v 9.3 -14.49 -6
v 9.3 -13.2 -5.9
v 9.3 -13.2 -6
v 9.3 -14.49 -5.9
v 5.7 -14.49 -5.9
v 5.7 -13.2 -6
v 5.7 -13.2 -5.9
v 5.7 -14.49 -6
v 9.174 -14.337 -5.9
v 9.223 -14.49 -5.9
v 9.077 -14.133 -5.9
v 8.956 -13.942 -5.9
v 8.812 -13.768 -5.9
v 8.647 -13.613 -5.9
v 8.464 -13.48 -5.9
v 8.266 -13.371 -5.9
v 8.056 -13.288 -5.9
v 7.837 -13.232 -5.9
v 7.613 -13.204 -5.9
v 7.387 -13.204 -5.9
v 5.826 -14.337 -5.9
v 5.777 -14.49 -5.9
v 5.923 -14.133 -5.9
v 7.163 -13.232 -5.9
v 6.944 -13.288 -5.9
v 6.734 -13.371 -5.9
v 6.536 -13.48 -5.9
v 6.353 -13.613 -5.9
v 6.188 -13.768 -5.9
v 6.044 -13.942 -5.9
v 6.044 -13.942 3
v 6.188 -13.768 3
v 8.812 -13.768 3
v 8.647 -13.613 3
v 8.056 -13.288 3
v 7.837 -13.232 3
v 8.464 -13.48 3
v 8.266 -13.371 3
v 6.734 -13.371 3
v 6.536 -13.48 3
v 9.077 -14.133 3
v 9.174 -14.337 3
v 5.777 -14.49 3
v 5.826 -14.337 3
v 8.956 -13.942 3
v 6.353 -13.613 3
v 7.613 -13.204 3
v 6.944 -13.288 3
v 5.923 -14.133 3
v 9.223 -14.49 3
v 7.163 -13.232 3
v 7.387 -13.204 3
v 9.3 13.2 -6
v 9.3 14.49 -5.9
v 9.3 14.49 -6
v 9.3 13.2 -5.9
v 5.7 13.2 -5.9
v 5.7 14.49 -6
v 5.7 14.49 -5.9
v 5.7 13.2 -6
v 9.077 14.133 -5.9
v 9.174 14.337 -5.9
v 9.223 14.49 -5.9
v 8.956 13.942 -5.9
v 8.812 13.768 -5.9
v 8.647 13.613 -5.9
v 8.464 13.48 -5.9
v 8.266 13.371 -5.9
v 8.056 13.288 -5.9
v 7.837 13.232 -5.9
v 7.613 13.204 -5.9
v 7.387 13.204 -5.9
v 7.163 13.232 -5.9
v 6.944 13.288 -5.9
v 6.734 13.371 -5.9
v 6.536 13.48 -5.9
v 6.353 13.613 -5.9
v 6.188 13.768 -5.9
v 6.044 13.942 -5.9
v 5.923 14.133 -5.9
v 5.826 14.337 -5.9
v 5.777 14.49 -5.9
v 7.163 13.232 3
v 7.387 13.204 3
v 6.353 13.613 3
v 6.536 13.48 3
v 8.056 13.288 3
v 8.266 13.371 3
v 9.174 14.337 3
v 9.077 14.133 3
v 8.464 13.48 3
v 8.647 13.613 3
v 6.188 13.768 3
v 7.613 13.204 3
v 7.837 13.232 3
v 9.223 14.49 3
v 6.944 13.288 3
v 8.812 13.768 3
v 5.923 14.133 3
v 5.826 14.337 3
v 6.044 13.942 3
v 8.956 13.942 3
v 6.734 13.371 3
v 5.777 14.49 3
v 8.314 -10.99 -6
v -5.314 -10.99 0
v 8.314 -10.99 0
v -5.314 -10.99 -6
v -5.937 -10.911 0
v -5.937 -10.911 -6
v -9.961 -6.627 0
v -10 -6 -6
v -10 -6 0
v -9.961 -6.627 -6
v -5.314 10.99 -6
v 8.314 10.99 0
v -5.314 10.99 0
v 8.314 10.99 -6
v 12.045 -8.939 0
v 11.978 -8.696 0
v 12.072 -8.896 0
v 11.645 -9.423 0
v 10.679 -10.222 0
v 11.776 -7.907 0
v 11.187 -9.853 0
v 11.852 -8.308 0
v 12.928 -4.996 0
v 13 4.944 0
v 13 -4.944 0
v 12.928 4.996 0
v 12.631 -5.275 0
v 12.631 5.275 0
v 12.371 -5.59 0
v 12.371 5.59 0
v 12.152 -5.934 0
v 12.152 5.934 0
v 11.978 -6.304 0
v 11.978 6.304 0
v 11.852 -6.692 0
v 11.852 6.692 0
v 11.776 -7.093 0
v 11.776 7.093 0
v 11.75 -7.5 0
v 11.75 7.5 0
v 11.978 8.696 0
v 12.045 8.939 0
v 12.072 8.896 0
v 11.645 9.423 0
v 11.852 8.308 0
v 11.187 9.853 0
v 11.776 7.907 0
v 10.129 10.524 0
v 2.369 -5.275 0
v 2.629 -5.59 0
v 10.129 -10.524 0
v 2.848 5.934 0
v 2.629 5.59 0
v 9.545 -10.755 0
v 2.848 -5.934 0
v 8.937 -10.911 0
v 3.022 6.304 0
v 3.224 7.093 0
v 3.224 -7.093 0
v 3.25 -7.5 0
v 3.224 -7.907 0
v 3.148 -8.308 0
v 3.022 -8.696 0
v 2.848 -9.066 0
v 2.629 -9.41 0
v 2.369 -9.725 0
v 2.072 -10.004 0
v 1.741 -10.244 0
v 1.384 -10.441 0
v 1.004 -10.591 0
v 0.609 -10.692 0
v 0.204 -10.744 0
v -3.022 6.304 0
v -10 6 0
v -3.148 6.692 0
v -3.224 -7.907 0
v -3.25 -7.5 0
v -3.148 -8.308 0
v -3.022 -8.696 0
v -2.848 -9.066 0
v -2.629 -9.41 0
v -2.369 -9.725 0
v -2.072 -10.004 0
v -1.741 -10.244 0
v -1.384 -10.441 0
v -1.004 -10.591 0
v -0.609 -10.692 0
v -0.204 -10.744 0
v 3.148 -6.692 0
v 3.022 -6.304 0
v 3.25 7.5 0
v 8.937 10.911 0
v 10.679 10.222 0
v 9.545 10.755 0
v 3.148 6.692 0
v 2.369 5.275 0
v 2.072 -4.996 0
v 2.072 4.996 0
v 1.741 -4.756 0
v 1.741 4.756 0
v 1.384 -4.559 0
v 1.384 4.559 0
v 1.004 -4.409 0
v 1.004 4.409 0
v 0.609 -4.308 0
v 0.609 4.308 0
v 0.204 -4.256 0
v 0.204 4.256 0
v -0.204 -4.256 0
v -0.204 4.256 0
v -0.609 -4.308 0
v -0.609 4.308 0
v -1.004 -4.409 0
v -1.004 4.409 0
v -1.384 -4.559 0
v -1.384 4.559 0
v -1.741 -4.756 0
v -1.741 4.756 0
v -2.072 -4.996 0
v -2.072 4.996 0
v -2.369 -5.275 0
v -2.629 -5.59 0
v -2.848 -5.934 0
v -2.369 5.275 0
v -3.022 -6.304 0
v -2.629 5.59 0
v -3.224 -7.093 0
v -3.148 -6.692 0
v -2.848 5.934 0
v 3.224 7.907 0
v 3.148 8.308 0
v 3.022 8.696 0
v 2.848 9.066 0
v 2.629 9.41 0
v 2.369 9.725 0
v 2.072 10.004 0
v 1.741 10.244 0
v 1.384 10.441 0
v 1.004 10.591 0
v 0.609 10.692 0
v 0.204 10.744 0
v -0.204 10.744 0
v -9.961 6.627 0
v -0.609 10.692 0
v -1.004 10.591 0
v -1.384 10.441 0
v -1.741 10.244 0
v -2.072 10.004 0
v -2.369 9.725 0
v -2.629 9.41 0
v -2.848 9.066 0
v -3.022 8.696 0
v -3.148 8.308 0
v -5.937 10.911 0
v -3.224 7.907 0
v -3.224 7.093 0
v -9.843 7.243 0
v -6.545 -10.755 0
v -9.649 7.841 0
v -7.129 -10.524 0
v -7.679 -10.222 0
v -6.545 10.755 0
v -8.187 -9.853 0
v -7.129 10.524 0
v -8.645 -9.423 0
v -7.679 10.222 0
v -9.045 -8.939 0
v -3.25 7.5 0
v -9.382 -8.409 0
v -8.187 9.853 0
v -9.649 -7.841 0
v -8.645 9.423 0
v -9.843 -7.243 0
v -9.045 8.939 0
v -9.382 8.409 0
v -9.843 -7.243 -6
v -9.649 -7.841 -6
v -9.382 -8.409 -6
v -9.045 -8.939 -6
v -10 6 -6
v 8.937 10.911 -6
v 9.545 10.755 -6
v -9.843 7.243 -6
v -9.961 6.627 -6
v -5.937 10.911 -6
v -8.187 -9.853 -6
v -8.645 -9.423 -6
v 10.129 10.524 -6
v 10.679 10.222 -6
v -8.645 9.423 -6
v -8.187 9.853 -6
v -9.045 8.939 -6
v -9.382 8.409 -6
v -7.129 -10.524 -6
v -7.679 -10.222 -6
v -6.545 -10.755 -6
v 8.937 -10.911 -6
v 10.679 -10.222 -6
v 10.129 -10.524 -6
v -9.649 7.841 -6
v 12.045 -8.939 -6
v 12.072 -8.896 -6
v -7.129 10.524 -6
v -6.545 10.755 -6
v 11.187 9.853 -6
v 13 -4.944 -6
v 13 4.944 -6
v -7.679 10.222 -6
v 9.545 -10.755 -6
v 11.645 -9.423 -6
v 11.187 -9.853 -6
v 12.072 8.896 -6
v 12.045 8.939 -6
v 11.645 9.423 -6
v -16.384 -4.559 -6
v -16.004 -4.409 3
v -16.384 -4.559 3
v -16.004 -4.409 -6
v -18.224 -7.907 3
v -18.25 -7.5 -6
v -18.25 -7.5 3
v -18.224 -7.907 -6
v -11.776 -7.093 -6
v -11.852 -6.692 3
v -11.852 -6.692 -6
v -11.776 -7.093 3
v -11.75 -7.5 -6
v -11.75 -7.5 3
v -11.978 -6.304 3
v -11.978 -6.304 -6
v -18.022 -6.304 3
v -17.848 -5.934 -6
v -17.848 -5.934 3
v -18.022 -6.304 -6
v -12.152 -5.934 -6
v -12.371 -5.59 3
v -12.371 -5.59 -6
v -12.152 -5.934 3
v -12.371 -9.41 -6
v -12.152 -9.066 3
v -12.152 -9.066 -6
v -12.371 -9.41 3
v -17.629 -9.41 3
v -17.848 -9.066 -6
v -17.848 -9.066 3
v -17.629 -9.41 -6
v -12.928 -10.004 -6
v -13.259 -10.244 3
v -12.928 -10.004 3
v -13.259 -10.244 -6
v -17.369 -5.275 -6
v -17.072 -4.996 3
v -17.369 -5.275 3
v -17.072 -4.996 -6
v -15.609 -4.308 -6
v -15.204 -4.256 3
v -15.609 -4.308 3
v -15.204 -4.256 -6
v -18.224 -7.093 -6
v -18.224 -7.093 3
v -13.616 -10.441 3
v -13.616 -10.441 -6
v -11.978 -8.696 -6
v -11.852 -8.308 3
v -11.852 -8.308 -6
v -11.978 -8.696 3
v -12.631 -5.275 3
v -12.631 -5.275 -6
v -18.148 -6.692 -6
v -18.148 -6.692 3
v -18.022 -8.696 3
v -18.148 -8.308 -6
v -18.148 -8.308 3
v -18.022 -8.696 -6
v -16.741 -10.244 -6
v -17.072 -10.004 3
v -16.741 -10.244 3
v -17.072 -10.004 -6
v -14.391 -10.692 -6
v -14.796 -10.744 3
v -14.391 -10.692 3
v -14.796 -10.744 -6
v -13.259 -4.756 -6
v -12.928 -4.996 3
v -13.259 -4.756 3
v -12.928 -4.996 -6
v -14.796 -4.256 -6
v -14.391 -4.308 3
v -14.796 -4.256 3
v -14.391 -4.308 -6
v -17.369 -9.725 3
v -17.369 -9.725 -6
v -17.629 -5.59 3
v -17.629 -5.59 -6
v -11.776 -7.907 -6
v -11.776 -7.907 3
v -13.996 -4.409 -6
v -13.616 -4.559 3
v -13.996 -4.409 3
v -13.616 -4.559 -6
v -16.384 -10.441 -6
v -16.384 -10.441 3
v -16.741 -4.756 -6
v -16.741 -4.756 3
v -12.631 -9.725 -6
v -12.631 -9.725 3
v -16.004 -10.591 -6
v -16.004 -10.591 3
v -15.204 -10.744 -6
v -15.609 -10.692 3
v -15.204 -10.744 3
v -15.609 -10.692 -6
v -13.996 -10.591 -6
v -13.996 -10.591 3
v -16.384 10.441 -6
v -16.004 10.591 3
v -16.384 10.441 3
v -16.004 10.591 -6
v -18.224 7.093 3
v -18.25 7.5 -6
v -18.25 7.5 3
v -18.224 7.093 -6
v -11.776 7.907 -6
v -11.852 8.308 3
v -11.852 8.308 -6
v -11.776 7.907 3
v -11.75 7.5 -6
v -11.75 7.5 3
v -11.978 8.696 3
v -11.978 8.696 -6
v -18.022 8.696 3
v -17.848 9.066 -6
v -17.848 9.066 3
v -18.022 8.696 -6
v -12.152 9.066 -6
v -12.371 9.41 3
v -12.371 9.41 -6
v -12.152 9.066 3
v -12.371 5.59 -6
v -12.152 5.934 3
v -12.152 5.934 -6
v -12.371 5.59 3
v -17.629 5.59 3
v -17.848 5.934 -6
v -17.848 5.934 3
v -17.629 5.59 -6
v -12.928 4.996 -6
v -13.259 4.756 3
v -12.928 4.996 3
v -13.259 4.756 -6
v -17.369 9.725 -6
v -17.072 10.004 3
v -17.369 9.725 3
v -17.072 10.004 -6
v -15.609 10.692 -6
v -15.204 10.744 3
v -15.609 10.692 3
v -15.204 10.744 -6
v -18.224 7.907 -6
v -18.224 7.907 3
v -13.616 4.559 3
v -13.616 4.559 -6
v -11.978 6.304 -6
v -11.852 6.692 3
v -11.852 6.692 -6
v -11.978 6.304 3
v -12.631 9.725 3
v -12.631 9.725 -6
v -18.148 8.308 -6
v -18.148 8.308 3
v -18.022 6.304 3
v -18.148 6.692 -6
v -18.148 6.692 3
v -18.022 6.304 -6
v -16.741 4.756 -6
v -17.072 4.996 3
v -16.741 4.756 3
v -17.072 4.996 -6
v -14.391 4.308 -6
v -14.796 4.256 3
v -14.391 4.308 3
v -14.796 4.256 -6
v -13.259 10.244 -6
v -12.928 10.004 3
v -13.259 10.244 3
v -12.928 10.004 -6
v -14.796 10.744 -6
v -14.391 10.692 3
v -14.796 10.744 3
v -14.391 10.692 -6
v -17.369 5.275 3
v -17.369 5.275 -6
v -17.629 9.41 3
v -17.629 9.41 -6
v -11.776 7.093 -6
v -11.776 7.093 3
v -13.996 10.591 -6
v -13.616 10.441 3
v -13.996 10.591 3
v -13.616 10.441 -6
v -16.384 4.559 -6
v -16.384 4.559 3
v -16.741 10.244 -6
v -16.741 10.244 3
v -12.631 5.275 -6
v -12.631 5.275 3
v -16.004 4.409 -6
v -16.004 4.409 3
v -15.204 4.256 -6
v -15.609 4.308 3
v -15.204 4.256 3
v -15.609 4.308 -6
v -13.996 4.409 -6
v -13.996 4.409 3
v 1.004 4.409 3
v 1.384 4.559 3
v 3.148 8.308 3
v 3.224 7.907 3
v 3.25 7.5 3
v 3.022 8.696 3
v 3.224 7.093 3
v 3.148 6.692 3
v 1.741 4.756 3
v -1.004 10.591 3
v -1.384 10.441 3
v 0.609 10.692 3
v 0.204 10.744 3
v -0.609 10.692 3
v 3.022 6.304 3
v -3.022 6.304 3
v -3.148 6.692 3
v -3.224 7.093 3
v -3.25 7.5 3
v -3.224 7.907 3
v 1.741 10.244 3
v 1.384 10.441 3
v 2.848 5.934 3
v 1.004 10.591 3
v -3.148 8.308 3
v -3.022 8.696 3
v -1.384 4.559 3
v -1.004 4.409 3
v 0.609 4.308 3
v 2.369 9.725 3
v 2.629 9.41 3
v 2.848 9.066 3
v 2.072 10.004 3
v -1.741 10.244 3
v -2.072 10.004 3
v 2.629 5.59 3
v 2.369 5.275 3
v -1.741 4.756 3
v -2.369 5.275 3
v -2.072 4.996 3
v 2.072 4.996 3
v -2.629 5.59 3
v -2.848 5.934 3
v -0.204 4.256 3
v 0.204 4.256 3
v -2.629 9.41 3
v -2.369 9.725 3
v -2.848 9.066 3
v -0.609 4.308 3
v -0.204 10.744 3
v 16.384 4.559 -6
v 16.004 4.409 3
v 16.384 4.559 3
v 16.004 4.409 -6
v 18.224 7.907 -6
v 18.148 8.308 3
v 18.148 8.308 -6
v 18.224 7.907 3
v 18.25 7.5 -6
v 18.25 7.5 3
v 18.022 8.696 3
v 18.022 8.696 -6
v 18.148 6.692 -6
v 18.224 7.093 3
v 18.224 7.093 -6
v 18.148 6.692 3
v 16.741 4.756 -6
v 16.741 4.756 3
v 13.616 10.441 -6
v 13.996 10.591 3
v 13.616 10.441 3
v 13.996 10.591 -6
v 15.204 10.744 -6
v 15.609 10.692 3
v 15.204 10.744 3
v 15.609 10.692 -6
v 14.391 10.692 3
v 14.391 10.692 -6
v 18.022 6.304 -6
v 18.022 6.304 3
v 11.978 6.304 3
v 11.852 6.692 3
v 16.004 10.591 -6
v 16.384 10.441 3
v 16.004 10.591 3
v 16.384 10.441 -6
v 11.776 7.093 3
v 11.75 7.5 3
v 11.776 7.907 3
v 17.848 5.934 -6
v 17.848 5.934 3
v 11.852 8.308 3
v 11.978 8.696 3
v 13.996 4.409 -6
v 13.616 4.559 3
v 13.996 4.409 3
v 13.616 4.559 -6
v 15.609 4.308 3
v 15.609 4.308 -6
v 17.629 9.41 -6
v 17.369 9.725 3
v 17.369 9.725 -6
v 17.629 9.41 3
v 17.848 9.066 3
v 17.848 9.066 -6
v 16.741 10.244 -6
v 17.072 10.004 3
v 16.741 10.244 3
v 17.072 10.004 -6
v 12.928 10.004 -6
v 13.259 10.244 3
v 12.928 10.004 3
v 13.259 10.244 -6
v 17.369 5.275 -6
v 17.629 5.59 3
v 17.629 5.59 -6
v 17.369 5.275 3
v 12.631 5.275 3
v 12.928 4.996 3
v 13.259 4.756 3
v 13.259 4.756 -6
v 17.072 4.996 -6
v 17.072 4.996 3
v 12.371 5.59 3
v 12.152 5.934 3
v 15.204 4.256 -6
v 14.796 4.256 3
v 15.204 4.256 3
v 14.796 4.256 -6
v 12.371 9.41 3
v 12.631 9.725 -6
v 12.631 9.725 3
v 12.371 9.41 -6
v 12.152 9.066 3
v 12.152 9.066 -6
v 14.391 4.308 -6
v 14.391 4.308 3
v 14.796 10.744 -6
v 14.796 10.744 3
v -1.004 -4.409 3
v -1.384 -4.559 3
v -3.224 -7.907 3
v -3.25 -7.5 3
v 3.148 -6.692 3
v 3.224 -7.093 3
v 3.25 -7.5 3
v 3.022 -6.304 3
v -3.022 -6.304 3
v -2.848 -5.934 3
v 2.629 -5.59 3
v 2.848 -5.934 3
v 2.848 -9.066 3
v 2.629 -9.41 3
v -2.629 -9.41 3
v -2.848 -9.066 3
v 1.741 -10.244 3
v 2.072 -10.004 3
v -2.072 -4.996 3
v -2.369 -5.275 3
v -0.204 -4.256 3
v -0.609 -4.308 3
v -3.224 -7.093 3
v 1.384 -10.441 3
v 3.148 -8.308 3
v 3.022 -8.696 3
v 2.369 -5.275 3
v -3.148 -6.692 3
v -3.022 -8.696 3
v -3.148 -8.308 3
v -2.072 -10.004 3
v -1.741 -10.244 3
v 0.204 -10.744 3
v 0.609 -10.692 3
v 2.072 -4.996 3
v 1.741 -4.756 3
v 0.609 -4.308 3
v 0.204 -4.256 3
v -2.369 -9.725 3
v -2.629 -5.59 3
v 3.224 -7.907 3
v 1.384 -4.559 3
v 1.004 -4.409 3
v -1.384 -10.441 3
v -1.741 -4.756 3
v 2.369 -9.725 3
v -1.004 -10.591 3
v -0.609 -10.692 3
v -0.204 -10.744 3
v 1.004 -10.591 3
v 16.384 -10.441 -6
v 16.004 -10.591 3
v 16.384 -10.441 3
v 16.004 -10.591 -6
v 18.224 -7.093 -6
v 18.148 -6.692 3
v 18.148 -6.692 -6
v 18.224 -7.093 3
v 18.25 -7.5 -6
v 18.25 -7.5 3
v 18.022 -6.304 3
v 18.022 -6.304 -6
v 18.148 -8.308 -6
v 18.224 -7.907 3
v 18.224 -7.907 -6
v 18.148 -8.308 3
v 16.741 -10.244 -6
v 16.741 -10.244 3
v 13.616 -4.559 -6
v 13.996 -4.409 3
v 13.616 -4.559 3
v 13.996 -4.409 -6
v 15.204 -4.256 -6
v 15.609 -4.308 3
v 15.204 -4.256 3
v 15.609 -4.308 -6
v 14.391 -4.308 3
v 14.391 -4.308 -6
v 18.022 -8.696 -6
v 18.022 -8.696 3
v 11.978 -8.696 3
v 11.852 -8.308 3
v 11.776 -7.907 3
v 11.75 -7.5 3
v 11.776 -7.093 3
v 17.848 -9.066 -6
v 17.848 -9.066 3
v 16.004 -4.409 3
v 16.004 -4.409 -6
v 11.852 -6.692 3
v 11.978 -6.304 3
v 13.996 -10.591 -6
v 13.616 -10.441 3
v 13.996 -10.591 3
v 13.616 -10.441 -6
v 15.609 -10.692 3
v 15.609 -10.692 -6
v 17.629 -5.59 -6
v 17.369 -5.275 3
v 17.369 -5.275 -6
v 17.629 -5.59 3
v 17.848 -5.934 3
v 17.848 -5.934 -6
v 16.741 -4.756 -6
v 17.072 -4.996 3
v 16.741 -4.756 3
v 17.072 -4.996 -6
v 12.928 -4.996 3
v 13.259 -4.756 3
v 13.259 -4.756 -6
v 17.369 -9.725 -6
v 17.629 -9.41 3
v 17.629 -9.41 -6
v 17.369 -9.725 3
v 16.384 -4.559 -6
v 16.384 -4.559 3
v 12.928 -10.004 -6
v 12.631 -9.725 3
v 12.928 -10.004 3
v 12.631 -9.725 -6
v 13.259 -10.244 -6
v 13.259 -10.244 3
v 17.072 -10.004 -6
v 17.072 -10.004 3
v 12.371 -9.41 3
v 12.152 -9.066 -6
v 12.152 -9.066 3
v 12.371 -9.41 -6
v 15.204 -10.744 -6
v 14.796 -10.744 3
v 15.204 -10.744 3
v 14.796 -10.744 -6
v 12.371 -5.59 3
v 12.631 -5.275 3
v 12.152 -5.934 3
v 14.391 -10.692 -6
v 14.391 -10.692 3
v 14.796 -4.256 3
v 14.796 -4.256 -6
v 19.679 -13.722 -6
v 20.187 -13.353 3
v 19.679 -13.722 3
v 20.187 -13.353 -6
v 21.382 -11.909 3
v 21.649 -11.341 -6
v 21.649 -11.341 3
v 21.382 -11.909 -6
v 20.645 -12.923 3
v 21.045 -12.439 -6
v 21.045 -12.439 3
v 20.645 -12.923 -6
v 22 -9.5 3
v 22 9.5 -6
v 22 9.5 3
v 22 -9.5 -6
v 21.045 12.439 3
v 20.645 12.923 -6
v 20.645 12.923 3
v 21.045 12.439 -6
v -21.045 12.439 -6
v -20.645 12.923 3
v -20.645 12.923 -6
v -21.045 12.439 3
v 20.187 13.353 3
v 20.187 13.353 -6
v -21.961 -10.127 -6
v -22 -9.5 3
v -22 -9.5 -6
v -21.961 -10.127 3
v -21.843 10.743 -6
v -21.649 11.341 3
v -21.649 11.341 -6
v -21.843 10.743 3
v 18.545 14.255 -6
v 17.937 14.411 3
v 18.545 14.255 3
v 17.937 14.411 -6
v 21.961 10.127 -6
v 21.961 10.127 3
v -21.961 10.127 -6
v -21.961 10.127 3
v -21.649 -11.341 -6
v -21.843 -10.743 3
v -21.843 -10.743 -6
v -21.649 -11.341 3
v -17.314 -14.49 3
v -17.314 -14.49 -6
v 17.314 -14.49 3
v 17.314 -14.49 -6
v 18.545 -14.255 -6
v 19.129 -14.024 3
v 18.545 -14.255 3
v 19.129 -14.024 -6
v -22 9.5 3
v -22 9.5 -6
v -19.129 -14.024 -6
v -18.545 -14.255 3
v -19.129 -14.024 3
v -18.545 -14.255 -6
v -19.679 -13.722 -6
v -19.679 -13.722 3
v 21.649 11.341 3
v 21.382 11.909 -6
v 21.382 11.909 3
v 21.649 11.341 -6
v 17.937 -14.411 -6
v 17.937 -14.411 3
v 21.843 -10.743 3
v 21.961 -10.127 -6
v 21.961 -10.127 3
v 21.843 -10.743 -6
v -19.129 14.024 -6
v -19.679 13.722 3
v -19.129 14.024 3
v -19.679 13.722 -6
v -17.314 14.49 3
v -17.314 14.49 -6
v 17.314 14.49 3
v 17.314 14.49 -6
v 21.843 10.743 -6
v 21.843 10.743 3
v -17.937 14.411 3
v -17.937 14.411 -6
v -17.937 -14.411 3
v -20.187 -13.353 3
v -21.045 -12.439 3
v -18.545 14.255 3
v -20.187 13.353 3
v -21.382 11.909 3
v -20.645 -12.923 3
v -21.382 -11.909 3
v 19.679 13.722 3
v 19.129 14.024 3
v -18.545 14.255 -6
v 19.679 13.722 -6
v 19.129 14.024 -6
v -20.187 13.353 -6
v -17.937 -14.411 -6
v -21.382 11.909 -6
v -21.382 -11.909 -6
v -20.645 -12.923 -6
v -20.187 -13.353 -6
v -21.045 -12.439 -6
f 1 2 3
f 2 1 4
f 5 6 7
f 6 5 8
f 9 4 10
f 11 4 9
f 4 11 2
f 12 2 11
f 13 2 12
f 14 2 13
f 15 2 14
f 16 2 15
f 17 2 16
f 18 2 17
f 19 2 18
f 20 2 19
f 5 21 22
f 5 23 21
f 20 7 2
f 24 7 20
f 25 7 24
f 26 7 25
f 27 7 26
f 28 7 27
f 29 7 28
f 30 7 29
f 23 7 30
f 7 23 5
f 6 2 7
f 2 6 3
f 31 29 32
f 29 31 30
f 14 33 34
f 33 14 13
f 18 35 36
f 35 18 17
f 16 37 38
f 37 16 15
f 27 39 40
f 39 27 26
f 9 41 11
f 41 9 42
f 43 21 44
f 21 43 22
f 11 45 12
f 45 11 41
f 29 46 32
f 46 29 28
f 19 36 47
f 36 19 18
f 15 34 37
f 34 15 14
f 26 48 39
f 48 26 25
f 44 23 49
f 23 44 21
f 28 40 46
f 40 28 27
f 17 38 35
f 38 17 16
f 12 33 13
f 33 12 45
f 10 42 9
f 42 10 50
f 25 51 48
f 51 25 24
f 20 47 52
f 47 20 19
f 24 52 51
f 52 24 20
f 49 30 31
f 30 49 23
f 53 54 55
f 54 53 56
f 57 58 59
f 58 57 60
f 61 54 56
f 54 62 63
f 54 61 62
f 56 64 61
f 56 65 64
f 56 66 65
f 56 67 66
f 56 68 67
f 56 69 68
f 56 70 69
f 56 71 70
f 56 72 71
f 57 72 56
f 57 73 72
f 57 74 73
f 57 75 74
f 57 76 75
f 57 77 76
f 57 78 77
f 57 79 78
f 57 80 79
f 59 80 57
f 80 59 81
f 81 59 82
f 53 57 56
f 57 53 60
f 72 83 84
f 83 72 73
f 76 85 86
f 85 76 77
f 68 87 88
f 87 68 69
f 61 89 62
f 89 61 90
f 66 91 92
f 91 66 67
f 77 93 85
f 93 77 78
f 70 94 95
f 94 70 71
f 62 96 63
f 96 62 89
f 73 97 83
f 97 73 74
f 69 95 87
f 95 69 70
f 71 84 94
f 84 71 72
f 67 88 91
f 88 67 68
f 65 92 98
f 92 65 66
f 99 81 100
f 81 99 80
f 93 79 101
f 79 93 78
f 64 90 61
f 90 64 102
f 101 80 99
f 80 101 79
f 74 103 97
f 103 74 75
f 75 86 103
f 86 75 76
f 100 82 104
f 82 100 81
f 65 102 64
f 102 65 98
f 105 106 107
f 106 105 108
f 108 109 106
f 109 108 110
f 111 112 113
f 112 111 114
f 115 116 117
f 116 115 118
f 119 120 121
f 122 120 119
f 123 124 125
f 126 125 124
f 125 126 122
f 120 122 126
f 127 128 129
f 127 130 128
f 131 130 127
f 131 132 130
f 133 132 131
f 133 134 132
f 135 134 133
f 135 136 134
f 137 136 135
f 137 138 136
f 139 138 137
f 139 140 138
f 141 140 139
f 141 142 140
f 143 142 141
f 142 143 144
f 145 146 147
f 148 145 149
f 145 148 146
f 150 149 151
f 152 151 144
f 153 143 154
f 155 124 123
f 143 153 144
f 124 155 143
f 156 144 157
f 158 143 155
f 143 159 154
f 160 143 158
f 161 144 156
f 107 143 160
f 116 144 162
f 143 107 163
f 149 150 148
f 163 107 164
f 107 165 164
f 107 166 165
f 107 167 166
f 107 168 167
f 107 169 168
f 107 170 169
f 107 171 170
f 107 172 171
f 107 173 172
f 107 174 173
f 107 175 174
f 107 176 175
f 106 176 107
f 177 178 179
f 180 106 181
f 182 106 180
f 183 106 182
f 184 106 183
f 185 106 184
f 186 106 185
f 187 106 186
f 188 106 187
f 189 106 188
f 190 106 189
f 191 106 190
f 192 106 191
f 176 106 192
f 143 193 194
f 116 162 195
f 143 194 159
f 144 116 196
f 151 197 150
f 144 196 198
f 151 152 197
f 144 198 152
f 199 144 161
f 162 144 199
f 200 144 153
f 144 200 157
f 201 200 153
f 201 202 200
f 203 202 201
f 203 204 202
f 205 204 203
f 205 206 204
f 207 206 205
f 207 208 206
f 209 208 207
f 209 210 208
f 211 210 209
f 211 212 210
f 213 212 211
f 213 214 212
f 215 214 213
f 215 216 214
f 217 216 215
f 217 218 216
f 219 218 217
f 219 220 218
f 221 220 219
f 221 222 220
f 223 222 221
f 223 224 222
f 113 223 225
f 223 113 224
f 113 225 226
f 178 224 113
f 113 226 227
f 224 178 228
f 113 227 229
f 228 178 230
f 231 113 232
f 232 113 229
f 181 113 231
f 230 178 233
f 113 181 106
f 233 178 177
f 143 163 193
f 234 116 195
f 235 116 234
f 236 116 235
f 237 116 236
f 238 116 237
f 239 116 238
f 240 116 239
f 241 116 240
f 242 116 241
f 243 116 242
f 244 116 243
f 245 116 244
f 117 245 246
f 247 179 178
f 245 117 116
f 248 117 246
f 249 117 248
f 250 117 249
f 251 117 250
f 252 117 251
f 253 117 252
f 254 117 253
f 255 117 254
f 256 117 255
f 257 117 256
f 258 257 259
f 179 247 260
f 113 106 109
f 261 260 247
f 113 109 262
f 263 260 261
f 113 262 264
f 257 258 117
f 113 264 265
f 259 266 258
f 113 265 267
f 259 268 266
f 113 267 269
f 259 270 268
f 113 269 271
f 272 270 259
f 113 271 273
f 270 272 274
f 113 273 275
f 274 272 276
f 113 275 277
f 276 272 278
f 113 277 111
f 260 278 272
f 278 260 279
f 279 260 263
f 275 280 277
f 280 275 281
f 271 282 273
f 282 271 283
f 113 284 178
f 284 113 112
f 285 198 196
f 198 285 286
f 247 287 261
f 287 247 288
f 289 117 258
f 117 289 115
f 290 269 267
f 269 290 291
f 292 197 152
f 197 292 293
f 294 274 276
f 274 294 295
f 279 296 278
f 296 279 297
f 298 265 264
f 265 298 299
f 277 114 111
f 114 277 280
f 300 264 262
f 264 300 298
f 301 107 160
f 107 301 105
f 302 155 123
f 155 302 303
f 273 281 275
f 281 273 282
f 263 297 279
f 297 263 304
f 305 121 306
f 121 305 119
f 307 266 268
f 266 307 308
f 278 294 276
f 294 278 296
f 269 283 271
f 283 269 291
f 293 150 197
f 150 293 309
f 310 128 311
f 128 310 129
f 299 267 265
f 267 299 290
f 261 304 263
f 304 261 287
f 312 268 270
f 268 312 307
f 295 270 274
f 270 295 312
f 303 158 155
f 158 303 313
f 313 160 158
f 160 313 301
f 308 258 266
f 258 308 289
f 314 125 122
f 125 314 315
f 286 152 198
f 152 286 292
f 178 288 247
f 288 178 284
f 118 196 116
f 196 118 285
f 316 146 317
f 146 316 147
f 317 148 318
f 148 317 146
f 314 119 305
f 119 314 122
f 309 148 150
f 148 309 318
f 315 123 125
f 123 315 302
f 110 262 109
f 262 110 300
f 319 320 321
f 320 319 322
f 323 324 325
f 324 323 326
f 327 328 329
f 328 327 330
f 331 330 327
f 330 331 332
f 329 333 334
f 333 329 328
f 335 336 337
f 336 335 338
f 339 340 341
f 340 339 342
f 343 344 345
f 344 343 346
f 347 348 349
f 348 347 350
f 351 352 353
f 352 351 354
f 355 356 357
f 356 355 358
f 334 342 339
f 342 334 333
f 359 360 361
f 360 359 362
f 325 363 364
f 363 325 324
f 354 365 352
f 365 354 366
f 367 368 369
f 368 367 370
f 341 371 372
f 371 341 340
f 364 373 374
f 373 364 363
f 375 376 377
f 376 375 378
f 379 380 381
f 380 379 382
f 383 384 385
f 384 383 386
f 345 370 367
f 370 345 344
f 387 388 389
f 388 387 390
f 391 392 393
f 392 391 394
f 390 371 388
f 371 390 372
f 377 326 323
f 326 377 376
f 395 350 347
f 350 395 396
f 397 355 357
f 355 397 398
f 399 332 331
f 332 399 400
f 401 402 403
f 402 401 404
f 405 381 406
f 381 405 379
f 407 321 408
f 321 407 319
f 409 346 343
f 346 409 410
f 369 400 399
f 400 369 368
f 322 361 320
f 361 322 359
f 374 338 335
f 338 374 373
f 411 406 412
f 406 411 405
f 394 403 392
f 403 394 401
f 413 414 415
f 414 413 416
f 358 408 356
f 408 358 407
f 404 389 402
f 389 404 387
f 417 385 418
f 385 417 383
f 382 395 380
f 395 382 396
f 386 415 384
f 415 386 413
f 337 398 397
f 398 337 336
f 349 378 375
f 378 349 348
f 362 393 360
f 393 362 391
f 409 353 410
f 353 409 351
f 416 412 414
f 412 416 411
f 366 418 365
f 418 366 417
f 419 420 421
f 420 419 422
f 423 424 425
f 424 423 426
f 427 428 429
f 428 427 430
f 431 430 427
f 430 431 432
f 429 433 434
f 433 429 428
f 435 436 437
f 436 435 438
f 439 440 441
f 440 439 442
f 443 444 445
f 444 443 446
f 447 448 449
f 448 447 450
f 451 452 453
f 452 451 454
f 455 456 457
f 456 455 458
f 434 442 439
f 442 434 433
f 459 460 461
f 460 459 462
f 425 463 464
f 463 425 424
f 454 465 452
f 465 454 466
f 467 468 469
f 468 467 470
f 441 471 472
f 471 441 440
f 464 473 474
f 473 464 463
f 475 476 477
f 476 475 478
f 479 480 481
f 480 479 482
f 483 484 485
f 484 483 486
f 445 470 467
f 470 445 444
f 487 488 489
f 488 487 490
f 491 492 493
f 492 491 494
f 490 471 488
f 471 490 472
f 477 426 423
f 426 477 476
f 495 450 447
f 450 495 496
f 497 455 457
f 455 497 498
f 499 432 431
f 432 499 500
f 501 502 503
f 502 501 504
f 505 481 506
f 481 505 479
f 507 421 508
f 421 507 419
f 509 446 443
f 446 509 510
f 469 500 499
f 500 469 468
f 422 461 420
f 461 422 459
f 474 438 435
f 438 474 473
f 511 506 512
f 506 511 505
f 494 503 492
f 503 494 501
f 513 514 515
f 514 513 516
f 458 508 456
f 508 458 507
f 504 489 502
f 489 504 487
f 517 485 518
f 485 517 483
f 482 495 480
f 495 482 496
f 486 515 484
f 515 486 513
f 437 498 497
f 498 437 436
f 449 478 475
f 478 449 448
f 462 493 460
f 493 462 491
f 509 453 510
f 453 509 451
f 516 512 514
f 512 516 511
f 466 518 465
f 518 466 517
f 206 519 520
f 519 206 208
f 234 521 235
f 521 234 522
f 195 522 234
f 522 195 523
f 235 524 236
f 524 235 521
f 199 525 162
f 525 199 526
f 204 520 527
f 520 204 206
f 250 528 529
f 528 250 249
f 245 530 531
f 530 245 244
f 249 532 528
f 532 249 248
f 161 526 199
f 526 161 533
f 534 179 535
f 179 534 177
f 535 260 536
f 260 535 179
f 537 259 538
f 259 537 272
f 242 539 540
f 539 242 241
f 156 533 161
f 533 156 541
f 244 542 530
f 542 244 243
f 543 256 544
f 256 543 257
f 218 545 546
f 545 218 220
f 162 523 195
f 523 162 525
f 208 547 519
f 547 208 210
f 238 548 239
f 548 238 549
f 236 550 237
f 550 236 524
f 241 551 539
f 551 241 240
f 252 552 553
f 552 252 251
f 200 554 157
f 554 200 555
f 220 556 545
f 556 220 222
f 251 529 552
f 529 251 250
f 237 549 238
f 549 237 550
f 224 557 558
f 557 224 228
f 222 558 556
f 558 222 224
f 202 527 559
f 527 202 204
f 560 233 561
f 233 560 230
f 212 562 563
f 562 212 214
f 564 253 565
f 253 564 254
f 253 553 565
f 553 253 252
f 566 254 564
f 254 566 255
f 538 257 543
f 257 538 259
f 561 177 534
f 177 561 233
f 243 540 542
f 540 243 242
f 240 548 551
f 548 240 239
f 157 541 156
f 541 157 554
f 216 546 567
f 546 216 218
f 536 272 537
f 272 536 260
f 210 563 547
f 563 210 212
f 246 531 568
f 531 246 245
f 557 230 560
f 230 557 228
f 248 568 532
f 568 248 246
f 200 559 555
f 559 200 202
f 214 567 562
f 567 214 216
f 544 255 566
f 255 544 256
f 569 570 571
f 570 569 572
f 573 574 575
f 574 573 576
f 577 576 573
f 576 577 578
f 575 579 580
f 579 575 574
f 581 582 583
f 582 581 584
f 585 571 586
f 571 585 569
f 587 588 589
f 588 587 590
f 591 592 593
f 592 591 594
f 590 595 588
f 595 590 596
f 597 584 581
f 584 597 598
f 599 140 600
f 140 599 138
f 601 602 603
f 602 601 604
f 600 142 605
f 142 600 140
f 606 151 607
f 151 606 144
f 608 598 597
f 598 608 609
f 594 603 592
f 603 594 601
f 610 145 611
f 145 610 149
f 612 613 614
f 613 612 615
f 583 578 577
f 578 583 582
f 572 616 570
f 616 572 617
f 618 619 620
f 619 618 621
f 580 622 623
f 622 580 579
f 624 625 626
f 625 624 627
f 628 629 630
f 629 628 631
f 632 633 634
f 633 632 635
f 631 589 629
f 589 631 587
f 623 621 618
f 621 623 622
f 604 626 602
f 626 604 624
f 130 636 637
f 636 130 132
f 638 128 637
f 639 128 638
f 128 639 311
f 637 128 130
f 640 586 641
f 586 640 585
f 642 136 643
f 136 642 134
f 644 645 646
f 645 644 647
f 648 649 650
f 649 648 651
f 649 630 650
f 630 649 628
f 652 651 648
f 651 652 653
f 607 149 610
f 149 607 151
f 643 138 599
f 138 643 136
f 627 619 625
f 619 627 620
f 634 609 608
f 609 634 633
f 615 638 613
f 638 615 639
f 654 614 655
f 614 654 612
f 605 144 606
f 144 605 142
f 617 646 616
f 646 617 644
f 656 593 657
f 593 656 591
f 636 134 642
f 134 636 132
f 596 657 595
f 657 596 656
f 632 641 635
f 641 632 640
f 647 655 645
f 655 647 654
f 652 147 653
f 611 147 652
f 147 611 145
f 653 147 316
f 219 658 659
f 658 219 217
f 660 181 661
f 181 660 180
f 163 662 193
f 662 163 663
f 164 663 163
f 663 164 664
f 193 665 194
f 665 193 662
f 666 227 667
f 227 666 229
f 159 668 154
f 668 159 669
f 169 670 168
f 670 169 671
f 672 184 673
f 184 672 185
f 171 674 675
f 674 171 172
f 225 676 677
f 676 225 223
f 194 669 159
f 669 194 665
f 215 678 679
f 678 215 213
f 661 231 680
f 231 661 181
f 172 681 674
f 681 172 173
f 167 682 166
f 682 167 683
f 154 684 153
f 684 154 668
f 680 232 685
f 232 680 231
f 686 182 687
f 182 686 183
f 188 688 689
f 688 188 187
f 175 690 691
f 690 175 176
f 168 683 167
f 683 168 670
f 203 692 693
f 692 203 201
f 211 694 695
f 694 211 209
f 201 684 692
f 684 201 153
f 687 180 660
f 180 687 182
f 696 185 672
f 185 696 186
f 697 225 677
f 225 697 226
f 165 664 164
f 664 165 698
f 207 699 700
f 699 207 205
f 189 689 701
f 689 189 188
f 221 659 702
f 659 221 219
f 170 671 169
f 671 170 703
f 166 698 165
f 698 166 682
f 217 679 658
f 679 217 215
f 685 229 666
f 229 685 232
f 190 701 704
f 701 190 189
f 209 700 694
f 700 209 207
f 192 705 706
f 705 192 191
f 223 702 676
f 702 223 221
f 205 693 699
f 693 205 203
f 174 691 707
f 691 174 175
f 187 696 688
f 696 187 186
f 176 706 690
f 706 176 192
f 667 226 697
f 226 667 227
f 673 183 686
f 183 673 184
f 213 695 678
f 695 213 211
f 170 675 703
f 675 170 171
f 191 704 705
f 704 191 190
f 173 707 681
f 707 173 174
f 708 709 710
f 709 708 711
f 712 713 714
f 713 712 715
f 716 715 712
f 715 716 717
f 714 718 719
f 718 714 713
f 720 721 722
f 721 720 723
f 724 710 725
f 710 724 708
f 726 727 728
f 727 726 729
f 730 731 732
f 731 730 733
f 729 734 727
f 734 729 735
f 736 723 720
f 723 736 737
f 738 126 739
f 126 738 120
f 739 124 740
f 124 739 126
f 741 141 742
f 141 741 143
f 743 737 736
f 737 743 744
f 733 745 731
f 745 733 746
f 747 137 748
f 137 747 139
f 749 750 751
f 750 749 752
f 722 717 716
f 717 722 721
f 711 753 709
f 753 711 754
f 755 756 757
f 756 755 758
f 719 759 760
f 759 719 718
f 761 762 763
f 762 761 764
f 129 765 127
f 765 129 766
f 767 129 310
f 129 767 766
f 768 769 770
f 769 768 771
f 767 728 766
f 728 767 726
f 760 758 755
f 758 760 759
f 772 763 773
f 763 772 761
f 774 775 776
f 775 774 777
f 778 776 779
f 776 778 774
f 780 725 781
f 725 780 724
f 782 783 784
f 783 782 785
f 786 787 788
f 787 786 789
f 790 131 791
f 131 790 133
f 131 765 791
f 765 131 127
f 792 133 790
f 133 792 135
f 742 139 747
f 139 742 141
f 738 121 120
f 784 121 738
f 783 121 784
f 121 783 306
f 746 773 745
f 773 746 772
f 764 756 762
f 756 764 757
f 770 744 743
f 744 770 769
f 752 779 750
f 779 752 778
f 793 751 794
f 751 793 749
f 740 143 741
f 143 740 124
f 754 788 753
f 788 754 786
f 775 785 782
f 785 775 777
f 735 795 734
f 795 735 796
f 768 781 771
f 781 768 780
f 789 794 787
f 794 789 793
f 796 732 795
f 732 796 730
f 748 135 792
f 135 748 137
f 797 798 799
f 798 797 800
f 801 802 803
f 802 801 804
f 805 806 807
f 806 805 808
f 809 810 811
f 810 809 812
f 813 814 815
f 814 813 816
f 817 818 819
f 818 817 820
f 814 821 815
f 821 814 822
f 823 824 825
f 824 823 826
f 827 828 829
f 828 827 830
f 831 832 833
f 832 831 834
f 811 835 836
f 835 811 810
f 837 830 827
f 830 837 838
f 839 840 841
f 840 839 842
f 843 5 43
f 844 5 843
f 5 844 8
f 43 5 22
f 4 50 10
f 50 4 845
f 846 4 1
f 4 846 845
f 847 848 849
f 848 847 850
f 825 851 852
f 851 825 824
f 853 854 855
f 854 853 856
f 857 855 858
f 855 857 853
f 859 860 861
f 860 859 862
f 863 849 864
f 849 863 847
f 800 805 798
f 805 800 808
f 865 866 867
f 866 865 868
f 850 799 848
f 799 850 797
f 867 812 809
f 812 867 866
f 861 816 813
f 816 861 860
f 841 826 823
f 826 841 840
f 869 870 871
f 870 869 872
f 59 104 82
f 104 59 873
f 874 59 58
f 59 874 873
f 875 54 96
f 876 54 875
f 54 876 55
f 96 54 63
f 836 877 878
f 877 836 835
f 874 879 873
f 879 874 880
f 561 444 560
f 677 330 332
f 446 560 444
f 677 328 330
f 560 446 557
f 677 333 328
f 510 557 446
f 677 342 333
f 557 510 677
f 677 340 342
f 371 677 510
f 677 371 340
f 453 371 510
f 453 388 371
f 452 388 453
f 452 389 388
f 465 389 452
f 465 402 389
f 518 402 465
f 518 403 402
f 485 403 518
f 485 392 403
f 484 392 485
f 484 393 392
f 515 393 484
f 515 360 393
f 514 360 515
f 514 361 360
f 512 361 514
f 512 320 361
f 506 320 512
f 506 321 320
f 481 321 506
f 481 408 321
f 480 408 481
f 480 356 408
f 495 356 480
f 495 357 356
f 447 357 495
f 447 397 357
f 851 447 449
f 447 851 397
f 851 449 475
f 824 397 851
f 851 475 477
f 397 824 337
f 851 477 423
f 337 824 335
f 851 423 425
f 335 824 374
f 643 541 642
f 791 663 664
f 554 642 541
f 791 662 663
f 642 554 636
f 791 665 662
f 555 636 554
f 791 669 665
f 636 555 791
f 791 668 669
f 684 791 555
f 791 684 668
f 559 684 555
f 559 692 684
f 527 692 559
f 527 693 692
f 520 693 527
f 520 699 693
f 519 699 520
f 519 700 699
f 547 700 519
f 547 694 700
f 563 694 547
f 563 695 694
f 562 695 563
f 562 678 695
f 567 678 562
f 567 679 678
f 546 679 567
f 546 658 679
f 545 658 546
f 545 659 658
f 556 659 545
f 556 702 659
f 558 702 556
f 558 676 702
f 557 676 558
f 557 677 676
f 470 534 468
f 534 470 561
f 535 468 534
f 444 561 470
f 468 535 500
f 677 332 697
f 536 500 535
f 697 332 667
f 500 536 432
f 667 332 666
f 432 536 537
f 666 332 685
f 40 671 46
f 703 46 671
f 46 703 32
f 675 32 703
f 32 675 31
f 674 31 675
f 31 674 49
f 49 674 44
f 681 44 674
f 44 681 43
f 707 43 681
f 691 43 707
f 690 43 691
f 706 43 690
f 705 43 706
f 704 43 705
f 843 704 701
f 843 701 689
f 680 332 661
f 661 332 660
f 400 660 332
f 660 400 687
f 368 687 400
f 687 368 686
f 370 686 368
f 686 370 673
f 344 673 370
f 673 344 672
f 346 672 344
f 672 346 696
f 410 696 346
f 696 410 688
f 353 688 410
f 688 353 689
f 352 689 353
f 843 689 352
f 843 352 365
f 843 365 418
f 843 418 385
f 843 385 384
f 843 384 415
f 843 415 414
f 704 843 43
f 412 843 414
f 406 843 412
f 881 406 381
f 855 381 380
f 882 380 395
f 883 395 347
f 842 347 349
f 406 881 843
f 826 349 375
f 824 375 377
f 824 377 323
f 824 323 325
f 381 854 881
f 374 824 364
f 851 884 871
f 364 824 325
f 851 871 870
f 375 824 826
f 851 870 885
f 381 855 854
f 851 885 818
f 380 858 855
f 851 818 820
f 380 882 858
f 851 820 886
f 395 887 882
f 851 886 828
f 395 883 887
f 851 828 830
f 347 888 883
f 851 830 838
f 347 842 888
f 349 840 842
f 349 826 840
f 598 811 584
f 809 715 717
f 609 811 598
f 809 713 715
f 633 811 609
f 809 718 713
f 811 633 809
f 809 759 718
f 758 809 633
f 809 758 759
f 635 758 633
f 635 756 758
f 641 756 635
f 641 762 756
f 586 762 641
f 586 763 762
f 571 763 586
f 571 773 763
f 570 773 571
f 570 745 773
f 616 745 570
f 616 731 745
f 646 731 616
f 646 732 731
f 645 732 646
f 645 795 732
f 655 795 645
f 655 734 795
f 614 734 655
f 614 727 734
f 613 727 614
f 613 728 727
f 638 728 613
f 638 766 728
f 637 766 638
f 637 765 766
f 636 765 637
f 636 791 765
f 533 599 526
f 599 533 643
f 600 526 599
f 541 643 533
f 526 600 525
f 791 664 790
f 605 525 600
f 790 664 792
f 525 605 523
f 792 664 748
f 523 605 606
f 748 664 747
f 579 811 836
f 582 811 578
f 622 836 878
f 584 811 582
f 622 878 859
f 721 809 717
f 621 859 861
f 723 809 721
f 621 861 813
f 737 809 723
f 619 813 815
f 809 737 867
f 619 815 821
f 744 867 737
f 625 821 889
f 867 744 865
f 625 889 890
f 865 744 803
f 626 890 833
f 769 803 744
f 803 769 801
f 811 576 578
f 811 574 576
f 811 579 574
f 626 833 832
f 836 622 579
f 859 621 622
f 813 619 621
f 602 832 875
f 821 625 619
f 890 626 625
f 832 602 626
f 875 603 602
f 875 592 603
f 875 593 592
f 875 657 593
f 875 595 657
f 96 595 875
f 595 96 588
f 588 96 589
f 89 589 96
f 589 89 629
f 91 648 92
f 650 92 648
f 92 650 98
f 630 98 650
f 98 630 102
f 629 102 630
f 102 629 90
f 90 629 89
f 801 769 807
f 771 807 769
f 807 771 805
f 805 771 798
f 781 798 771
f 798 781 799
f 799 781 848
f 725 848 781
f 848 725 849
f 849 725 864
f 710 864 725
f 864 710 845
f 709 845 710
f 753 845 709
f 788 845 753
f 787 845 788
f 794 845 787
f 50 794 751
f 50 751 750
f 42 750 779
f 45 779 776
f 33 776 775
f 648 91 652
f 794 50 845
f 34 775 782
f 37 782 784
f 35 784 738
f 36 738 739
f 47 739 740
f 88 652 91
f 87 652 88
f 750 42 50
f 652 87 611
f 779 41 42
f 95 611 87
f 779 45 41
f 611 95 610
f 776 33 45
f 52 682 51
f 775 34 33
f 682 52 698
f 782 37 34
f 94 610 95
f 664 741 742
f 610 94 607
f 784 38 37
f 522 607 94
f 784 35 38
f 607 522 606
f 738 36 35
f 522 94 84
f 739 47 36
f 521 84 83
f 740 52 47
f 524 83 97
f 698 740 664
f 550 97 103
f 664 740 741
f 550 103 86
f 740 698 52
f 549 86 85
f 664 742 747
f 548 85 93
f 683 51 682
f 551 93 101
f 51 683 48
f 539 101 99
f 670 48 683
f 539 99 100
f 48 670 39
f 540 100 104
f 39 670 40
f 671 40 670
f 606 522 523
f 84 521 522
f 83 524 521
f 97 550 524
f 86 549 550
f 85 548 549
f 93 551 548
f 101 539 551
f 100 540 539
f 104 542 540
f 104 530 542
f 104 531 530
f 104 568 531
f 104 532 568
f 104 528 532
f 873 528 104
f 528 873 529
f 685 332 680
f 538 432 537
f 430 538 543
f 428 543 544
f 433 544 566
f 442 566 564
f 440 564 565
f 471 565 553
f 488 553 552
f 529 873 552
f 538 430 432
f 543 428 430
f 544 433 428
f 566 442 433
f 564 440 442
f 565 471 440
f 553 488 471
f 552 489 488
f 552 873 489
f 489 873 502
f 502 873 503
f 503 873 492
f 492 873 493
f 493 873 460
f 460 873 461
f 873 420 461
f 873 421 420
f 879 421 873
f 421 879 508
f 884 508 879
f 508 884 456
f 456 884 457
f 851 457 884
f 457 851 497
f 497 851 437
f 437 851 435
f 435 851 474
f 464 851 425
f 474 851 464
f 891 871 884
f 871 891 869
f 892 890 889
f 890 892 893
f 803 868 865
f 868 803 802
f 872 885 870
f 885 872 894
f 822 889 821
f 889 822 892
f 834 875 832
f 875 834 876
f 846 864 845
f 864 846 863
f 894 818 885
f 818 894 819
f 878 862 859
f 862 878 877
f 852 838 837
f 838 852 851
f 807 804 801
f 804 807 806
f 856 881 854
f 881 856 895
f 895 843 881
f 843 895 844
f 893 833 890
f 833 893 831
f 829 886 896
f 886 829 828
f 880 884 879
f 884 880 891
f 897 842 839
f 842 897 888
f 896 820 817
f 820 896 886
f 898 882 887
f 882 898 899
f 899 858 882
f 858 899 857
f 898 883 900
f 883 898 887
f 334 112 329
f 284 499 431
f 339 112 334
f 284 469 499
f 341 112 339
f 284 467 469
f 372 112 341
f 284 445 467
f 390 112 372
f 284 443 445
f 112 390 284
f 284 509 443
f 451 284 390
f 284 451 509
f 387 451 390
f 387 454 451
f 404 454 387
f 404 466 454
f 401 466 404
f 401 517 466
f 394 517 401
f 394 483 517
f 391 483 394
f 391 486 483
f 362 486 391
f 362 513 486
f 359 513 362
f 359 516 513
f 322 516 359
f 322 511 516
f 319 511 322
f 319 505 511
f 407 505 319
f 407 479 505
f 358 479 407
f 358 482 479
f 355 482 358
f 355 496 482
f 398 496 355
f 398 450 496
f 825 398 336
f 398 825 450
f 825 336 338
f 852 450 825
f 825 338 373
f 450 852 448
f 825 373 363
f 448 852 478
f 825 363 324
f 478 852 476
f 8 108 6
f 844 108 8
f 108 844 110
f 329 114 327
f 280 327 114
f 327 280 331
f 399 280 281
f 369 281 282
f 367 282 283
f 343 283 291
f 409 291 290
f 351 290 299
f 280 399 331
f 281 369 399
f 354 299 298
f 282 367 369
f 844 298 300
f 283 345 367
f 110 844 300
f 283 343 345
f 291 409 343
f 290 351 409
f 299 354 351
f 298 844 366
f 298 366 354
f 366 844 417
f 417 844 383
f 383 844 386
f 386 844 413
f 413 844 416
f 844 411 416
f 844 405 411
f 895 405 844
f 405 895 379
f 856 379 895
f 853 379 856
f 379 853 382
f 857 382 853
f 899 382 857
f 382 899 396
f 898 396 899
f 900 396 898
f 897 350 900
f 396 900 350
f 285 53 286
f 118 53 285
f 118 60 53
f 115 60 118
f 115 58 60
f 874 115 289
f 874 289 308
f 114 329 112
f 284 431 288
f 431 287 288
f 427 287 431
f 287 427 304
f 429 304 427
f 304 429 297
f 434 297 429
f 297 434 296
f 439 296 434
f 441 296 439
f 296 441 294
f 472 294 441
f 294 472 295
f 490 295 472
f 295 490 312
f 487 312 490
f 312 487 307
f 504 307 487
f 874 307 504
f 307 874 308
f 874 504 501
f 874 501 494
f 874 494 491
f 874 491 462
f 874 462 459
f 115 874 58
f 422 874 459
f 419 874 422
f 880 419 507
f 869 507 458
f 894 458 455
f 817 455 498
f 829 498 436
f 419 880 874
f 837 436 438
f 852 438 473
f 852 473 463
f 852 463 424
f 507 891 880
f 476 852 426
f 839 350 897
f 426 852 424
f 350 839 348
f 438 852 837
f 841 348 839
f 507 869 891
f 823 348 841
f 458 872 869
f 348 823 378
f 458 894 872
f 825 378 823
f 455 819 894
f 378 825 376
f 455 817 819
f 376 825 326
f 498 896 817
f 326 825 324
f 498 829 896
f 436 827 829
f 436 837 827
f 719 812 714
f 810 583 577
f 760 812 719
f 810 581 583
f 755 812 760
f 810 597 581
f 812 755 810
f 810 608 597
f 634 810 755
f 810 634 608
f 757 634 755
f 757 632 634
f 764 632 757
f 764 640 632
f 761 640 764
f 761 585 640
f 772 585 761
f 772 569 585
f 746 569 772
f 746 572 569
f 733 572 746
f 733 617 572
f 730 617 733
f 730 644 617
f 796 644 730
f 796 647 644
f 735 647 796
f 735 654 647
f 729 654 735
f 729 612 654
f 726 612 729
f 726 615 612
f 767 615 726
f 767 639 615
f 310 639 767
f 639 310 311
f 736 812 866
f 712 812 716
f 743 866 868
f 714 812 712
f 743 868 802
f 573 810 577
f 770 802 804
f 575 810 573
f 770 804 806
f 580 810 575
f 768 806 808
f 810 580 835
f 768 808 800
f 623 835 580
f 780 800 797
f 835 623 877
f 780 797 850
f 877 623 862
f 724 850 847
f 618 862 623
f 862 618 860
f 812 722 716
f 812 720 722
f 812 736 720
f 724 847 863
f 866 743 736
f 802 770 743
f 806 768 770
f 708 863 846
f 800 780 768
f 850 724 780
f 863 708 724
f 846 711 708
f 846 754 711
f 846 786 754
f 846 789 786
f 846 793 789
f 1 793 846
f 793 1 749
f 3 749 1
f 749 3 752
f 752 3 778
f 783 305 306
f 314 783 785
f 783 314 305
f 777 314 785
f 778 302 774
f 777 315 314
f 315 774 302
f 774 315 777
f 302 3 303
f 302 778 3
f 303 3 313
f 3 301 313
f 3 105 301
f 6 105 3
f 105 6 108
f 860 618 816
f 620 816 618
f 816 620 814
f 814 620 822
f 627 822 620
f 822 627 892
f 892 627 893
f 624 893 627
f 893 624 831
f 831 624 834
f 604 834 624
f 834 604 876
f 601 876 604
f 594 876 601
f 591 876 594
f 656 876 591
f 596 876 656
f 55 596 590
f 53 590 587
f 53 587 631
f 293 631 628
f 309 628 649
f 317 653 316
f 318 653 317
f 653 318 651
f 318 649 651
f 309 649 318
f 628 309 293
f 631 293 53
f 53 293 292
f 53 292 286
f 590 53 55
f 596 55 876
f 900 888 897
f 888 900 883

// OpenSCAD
$fn = 50;


difference() {
	union() {
		*color(alpha = 1.0000000000, c = "gray") {
			translate(v = [0, 14, -6]) {
				linear_extrude(height = 2) {
					text(font = "Arial:style=Bold", halign = "center", size = 4.5000000000, text = "COMMENT description oobb_plate_shape_positive_type_9_depth_0_0_-6_pos_spacer_extra_9_thickness_3_width_2_height_0_0_-9_pos_plate", valign = "center");
				}
			}
		}
		translate(v = [0, 0, -6]) {
			hull() {
				translate(v = [-17.0000000000, 9.5000000000, 0]) {
					cylinder(h = 9, r = 5);
				}
				translate(v = [17.0000000000, 9.5000000000, 0]) {
					cylinder(h = 9, r = 5);
				}
				translate(v = [-17.0000000000, -9.5000000000, 0]) {
					cylinder(h = 9, r = 5);
				}
				translate(v = [17.0000000000, -9.5000000000, 0]) {
					cylinder(h = 9, r = 5);
				}
			}
		}
		*color(alpha = 1.0000000000, c = "gray") {
			translate(v = [0, 14, -9]) {
				linear_extrude(height = 2) {
					text(font = "Arial:style=Bold", halign = "center", size = 4.5000000000, text = "COMMENT description oobb_holes_shape_p_type_0_0_-9_pos_spacer_extra_9_thickness_3_width_2_height_0_0_-9_pos_plate_'left'_'right'_'top'_hole_sides_'left'_'right'_'top'_holes_true_both_holes", valign = "center");
				}
			}
		}
		*color(alpha = 1.0000000000, c = "gray") {
			translate(v = [0, 14, -3]) {
				rotate(a = [0, 0, 180]) {
					linear_extrude(height = 2) {
						text(font = "Arial:style=Bold", halign = "center", size = 4.5000000000, text = "COMMENT description oobb_wire_spacer_shape_0_0_-3_pos_spacer_extra_9_thickness_3_width_2_height_0_0_-9_pos_plate_0_0_180_rot", valign = "center");
					}
				}
			}
		}
	}
	union() {
		translate(v = [7.5000000000, -15, -9]) {
			rotate(a = [0, 0, 0]) {
				difference() {
					union() {
						#translate(v = [-1.8000000000, -3.0000000000, -0.3000000000]) {
							cube(size = [3.6000000000, 6.0000000000, 0.3000000000]);
						}
						#translate(v = [-1.8000000000, -1.8000000000, -0.6000000000]) {
							cube(size = [3.6000000000, 3.6000000000, 0.3000000000]);
						}
						#translate(v = [-1.8000000000, -3.0000000000, 2.5000000000]) {
							cube(size = [3.6000000000, 6.0000000000, 0.3000000000]);
						}
						#translate(v = [-1.8000000000, -1.8000000000, 2.8000000000]) {
							cube(size = [3.6000000000, 3.6000000000, 0.3000000000]);
						}
						#translate(v = [0, 0, -50.0000000000]) {
							cylinder(h = 100, r = 1.8000000000);
						}
						#linear_extrude(height = 2.5000000000) {
							polygon(points = [[3.4620000000, 0.0000000000], [1.7310000000, 2.9981799479], [-1.7310000000, 2.9981799479], [-3.4620000000, 0.0000000000], [-1.7310000000, -2.9981799479], [1.7310000000, -2.9981799479]]);
						}
						#translate(v = [-1.8000000000, -3.0000000000, -0.3000000000]) {
							cube(size = [3.6000000000, 6.0000000000, 0.3000000000]);
						}
						#translate(v = [-1.8000000000, -1.8000000000, -0.6000000000]) {
							cube(size = [3.6000000000, 3.6000000000, 0.3000000000]);
						}
						#translate(v = [-1.8000000000, -3.0000000000, 2.5000000000]) {
							cube(size = [3.6000000000, 6.0000000000, 0.3000000000]);
						}
						#translate(v = [-1.8000000000, -1.8000000000, 2.8000000000]) {
							cube(size = [3.6000000000, 3.6000000000, 0.3000000000]);
						}
						#translate(v = [0, 0, -50.0000000000]) {
							cylinder(h = 100, r = 1.8000000000);
						}
						#translate(v = [-1.8000000000, -3.0000000000, -0.3000000000]) {
							cube(size = [3.6000000000, 6.0000000000, 0.3000000000]);
						}
						#translate(v = [-1.8000000000, -1.8000000000, -0.6000000000]) {
							cube(size = [3.6000000000, 3.6000000000, 0.3000000000]);
						}
						#translate(v = [-1.8000000000, -3.0000000000, 2.5000000000]) {
							cube(size = [3.6000000000, 6.0000000000, 0.3000000000]);
						}
						#translate(v = [-1.8000000000, -1.8000000000, 2.8000000000]) {
							cube(size = [3.6000000000, 3.6000000000, 0.3000000000]);
						}
						#translate(v = [0, 0, -50.0000000000]) {
							cylinder(h = 100, r = 1.8000000000);
						}
					}
					union();
				}
			}
		}
		translate(v = [7.5000000000, 15, -9]) {
			rotate(a = [0, 0, 0]) {
				difference() {
					union() {
						#translate(v = [-1.8000000000, -3.0000000000, -0.3000000000]) {
							cube(size = [3.6000000000, 6.0000000000, 0.3000000000]);
						}
						#translate(v = [-1.8000000000, -1.8000000000, -0.6000000000]) {
							cube(size = [3.6000000000, 3.6000000000, 0.3000000000]);
						}
						#translate(v = [-1.8000000000, -3.0000000000, 2.5000000000]) {
							cube(size = [3.6000000000, 6.0000000000, 0.3000000000]);
						}
						#translate(v = [-1.8000000000, -1.8000000000, 2.8000000000]) {
							cube(size = [3.6000000000, 3.6000000000, 0.3000000000]);
						}
						#translate(v = [0, 0, -50.0000000000]) {
							cylinder(h = 100, r = 1.8000000000);
						}
						#linear_extrude(height = 2.5000000000) {
							polygon(points = [[3.4620000000, 0.0000000000], [1.7310000000, 2.9981799479], [-1.7310000000, 2.9981799479], [-3.4620000000, 0.0000000000], [-1.7310000000, -2.9981799479], [1.7310000000, -2.9981799479]]);
						}
						#translate(v = [-1.8000000000, -3.0000000000, -0.3000000000]) {
							cube(size = [3.6000000000, 6.0000000000, 0.3000000000]);
						}
						#translate(v = [-1.8000000000, -1.8000000000, -0.6000000000]) {
							cube(size = [3.6000000000, 3.6000000000, 0.3000000000]);
						}
						#translate(v = [-1.8000000000, -3.0000000000, 2.5000000000]) {
							cube(size = [3.6000000000, 6.0000000000, 0.3000000000]);
						}
						#translate(v = [-1.8000000000, -1.8000000000, 2.8000000000]) {
							cube(size = [3.6000000000, 3.6000000000, 0.3000000000]);
						}
						#translate(v = [0, 0, -50.0000000000]) {
							cylinder(h = 100, r = 1.8000000000);
						}
						#translate(v = [-1.8000000000, -3.0000000000, -0.3000000000]) {
							cube(size = [3.6000000000, 6.0000000000, 0.3000000000]);
						}
						#translate(v = [-1.8000000000, -1.8000000000, -0.6000000000]) {
							cube(size = [3.6000000000, 3.6000000000, 0.3000000000]);
						}
						#translate(v = [-1.8000000000, -3.0000000000, 2.5000000000]) {
							cube(size = [3.6000000000, 6.0000000000, 0.3000000000]);
						}
						#translate(v = [-1.8000000000, -1.8000000000, 2.8000000000]) {
							cube(size = [3.6000000000, 3.6000000000, 0.3000000000]);
						}
						#translate(v = [0, 0, -50.0000000000]) {
							cylinder(h = 100, r = 1.8000000000);
						}
					}
					union();
				}
			}
		}
		translate(v = [0, 0, -3]) {
			rotate(a = [0, 0, 180]) {
				difference() {
					union() {
						translate(v = [-1.5000000000, 0, -6]) {
							hull() {
								translate(v = [-6.5000000000, 6.0000000000, 0]) {
									cylinder(h = 9, r = 5);
								}
								translate(v = [6.5000000000, 6.0000000000, 0]) {
									cylinder(h = 9, r = 5);
								}
								translate(v = [-6.5000000000, -6.0000000000, 0]) {
									cylinder(h = 9, r = 5);
								}
								translate(v = [6.5000000000, -6.0000000000, 0]) {
									cylinder(h = 9, r = 5);
								}
							}
						}
					}
					union();
				}
			}
		}
		translate(v = [-15.0000000000, -7.5000000000, -50.0000000000]) {
			cylinder(h = 100, r = 3.2500000000);
		}
		translate(v = [-15.0000000000, 7.5000000000, -50.0000000000]) {
			cylinder(h = 100, r = 3.2500000000);
		}
		translate(v = [-15.0000000000, 7.5000000000, -50.0000000000]) {
			cylinder(h = 100, r = 3.2500000000);
		}
		translate(v = [0.0000000000, 7.5000000000, -50.0000000000]) {
			cylinder(h = 100, r = 3.2500000000);
		}
		translate(v = [15.0000000000, 7.5000000000, -50.0000000000]) {
			cylinder(h = 100, r = 3.2500000000);
		}
		translate(v = [-15.0000000000, -7.5000000000, -50.0000000000]) {
			cylinder(h = 100, r = 3.2500000000);
		}
		translate(v = [0.0000000000, -7.5000000000, -50.0000000000]) {
			cylinder(h = 100, r = 3.2500000000);
		}
		translate(v = [15.0000000000, -7.5000000000, -50.0000000000]) {
			cylinder(h = 100, r = 3.2500000000);
		}
		*color(alpha = 1.0000000000, c = "gray") {
			translate(v = [7.5000000000, -1, -9]) {
				linear_extrude(height = 2) {
					text(font = "Arial:style=Bold", halign = "center", size = 4.5000000000, text = "COMMENT description oobb_nut_shape_negative_type_m3_radius_name_7.5_-15_-9_pos_9_thickness_3_width_2_height_0_0_-9_pos_plate_bottom_zz_true_overhang_0_0_0_rot_false_nut_true_hole", valign = "center");
				}
			}
		}
		*color(alpha = 1.0000000000, c = "gray") {
			translate(v = [7.5000000000, 29, -9]) {
				linear_extrude(height = 2) {
					text(font = "Arial:style=Bold", halign = "center", size = 4.5000000000, text = "COMMENT description oobb_nut_shape_negative_type_m3_radius_name_7.5_15_-9_pos_9_thickness_3_width_2_height_0_0_-9_pos_plate_bottom_zz_true_overhang_0_0_0_rot_false_nut_true_hole", valign = "center");
				}
			}
		}
	}
}
